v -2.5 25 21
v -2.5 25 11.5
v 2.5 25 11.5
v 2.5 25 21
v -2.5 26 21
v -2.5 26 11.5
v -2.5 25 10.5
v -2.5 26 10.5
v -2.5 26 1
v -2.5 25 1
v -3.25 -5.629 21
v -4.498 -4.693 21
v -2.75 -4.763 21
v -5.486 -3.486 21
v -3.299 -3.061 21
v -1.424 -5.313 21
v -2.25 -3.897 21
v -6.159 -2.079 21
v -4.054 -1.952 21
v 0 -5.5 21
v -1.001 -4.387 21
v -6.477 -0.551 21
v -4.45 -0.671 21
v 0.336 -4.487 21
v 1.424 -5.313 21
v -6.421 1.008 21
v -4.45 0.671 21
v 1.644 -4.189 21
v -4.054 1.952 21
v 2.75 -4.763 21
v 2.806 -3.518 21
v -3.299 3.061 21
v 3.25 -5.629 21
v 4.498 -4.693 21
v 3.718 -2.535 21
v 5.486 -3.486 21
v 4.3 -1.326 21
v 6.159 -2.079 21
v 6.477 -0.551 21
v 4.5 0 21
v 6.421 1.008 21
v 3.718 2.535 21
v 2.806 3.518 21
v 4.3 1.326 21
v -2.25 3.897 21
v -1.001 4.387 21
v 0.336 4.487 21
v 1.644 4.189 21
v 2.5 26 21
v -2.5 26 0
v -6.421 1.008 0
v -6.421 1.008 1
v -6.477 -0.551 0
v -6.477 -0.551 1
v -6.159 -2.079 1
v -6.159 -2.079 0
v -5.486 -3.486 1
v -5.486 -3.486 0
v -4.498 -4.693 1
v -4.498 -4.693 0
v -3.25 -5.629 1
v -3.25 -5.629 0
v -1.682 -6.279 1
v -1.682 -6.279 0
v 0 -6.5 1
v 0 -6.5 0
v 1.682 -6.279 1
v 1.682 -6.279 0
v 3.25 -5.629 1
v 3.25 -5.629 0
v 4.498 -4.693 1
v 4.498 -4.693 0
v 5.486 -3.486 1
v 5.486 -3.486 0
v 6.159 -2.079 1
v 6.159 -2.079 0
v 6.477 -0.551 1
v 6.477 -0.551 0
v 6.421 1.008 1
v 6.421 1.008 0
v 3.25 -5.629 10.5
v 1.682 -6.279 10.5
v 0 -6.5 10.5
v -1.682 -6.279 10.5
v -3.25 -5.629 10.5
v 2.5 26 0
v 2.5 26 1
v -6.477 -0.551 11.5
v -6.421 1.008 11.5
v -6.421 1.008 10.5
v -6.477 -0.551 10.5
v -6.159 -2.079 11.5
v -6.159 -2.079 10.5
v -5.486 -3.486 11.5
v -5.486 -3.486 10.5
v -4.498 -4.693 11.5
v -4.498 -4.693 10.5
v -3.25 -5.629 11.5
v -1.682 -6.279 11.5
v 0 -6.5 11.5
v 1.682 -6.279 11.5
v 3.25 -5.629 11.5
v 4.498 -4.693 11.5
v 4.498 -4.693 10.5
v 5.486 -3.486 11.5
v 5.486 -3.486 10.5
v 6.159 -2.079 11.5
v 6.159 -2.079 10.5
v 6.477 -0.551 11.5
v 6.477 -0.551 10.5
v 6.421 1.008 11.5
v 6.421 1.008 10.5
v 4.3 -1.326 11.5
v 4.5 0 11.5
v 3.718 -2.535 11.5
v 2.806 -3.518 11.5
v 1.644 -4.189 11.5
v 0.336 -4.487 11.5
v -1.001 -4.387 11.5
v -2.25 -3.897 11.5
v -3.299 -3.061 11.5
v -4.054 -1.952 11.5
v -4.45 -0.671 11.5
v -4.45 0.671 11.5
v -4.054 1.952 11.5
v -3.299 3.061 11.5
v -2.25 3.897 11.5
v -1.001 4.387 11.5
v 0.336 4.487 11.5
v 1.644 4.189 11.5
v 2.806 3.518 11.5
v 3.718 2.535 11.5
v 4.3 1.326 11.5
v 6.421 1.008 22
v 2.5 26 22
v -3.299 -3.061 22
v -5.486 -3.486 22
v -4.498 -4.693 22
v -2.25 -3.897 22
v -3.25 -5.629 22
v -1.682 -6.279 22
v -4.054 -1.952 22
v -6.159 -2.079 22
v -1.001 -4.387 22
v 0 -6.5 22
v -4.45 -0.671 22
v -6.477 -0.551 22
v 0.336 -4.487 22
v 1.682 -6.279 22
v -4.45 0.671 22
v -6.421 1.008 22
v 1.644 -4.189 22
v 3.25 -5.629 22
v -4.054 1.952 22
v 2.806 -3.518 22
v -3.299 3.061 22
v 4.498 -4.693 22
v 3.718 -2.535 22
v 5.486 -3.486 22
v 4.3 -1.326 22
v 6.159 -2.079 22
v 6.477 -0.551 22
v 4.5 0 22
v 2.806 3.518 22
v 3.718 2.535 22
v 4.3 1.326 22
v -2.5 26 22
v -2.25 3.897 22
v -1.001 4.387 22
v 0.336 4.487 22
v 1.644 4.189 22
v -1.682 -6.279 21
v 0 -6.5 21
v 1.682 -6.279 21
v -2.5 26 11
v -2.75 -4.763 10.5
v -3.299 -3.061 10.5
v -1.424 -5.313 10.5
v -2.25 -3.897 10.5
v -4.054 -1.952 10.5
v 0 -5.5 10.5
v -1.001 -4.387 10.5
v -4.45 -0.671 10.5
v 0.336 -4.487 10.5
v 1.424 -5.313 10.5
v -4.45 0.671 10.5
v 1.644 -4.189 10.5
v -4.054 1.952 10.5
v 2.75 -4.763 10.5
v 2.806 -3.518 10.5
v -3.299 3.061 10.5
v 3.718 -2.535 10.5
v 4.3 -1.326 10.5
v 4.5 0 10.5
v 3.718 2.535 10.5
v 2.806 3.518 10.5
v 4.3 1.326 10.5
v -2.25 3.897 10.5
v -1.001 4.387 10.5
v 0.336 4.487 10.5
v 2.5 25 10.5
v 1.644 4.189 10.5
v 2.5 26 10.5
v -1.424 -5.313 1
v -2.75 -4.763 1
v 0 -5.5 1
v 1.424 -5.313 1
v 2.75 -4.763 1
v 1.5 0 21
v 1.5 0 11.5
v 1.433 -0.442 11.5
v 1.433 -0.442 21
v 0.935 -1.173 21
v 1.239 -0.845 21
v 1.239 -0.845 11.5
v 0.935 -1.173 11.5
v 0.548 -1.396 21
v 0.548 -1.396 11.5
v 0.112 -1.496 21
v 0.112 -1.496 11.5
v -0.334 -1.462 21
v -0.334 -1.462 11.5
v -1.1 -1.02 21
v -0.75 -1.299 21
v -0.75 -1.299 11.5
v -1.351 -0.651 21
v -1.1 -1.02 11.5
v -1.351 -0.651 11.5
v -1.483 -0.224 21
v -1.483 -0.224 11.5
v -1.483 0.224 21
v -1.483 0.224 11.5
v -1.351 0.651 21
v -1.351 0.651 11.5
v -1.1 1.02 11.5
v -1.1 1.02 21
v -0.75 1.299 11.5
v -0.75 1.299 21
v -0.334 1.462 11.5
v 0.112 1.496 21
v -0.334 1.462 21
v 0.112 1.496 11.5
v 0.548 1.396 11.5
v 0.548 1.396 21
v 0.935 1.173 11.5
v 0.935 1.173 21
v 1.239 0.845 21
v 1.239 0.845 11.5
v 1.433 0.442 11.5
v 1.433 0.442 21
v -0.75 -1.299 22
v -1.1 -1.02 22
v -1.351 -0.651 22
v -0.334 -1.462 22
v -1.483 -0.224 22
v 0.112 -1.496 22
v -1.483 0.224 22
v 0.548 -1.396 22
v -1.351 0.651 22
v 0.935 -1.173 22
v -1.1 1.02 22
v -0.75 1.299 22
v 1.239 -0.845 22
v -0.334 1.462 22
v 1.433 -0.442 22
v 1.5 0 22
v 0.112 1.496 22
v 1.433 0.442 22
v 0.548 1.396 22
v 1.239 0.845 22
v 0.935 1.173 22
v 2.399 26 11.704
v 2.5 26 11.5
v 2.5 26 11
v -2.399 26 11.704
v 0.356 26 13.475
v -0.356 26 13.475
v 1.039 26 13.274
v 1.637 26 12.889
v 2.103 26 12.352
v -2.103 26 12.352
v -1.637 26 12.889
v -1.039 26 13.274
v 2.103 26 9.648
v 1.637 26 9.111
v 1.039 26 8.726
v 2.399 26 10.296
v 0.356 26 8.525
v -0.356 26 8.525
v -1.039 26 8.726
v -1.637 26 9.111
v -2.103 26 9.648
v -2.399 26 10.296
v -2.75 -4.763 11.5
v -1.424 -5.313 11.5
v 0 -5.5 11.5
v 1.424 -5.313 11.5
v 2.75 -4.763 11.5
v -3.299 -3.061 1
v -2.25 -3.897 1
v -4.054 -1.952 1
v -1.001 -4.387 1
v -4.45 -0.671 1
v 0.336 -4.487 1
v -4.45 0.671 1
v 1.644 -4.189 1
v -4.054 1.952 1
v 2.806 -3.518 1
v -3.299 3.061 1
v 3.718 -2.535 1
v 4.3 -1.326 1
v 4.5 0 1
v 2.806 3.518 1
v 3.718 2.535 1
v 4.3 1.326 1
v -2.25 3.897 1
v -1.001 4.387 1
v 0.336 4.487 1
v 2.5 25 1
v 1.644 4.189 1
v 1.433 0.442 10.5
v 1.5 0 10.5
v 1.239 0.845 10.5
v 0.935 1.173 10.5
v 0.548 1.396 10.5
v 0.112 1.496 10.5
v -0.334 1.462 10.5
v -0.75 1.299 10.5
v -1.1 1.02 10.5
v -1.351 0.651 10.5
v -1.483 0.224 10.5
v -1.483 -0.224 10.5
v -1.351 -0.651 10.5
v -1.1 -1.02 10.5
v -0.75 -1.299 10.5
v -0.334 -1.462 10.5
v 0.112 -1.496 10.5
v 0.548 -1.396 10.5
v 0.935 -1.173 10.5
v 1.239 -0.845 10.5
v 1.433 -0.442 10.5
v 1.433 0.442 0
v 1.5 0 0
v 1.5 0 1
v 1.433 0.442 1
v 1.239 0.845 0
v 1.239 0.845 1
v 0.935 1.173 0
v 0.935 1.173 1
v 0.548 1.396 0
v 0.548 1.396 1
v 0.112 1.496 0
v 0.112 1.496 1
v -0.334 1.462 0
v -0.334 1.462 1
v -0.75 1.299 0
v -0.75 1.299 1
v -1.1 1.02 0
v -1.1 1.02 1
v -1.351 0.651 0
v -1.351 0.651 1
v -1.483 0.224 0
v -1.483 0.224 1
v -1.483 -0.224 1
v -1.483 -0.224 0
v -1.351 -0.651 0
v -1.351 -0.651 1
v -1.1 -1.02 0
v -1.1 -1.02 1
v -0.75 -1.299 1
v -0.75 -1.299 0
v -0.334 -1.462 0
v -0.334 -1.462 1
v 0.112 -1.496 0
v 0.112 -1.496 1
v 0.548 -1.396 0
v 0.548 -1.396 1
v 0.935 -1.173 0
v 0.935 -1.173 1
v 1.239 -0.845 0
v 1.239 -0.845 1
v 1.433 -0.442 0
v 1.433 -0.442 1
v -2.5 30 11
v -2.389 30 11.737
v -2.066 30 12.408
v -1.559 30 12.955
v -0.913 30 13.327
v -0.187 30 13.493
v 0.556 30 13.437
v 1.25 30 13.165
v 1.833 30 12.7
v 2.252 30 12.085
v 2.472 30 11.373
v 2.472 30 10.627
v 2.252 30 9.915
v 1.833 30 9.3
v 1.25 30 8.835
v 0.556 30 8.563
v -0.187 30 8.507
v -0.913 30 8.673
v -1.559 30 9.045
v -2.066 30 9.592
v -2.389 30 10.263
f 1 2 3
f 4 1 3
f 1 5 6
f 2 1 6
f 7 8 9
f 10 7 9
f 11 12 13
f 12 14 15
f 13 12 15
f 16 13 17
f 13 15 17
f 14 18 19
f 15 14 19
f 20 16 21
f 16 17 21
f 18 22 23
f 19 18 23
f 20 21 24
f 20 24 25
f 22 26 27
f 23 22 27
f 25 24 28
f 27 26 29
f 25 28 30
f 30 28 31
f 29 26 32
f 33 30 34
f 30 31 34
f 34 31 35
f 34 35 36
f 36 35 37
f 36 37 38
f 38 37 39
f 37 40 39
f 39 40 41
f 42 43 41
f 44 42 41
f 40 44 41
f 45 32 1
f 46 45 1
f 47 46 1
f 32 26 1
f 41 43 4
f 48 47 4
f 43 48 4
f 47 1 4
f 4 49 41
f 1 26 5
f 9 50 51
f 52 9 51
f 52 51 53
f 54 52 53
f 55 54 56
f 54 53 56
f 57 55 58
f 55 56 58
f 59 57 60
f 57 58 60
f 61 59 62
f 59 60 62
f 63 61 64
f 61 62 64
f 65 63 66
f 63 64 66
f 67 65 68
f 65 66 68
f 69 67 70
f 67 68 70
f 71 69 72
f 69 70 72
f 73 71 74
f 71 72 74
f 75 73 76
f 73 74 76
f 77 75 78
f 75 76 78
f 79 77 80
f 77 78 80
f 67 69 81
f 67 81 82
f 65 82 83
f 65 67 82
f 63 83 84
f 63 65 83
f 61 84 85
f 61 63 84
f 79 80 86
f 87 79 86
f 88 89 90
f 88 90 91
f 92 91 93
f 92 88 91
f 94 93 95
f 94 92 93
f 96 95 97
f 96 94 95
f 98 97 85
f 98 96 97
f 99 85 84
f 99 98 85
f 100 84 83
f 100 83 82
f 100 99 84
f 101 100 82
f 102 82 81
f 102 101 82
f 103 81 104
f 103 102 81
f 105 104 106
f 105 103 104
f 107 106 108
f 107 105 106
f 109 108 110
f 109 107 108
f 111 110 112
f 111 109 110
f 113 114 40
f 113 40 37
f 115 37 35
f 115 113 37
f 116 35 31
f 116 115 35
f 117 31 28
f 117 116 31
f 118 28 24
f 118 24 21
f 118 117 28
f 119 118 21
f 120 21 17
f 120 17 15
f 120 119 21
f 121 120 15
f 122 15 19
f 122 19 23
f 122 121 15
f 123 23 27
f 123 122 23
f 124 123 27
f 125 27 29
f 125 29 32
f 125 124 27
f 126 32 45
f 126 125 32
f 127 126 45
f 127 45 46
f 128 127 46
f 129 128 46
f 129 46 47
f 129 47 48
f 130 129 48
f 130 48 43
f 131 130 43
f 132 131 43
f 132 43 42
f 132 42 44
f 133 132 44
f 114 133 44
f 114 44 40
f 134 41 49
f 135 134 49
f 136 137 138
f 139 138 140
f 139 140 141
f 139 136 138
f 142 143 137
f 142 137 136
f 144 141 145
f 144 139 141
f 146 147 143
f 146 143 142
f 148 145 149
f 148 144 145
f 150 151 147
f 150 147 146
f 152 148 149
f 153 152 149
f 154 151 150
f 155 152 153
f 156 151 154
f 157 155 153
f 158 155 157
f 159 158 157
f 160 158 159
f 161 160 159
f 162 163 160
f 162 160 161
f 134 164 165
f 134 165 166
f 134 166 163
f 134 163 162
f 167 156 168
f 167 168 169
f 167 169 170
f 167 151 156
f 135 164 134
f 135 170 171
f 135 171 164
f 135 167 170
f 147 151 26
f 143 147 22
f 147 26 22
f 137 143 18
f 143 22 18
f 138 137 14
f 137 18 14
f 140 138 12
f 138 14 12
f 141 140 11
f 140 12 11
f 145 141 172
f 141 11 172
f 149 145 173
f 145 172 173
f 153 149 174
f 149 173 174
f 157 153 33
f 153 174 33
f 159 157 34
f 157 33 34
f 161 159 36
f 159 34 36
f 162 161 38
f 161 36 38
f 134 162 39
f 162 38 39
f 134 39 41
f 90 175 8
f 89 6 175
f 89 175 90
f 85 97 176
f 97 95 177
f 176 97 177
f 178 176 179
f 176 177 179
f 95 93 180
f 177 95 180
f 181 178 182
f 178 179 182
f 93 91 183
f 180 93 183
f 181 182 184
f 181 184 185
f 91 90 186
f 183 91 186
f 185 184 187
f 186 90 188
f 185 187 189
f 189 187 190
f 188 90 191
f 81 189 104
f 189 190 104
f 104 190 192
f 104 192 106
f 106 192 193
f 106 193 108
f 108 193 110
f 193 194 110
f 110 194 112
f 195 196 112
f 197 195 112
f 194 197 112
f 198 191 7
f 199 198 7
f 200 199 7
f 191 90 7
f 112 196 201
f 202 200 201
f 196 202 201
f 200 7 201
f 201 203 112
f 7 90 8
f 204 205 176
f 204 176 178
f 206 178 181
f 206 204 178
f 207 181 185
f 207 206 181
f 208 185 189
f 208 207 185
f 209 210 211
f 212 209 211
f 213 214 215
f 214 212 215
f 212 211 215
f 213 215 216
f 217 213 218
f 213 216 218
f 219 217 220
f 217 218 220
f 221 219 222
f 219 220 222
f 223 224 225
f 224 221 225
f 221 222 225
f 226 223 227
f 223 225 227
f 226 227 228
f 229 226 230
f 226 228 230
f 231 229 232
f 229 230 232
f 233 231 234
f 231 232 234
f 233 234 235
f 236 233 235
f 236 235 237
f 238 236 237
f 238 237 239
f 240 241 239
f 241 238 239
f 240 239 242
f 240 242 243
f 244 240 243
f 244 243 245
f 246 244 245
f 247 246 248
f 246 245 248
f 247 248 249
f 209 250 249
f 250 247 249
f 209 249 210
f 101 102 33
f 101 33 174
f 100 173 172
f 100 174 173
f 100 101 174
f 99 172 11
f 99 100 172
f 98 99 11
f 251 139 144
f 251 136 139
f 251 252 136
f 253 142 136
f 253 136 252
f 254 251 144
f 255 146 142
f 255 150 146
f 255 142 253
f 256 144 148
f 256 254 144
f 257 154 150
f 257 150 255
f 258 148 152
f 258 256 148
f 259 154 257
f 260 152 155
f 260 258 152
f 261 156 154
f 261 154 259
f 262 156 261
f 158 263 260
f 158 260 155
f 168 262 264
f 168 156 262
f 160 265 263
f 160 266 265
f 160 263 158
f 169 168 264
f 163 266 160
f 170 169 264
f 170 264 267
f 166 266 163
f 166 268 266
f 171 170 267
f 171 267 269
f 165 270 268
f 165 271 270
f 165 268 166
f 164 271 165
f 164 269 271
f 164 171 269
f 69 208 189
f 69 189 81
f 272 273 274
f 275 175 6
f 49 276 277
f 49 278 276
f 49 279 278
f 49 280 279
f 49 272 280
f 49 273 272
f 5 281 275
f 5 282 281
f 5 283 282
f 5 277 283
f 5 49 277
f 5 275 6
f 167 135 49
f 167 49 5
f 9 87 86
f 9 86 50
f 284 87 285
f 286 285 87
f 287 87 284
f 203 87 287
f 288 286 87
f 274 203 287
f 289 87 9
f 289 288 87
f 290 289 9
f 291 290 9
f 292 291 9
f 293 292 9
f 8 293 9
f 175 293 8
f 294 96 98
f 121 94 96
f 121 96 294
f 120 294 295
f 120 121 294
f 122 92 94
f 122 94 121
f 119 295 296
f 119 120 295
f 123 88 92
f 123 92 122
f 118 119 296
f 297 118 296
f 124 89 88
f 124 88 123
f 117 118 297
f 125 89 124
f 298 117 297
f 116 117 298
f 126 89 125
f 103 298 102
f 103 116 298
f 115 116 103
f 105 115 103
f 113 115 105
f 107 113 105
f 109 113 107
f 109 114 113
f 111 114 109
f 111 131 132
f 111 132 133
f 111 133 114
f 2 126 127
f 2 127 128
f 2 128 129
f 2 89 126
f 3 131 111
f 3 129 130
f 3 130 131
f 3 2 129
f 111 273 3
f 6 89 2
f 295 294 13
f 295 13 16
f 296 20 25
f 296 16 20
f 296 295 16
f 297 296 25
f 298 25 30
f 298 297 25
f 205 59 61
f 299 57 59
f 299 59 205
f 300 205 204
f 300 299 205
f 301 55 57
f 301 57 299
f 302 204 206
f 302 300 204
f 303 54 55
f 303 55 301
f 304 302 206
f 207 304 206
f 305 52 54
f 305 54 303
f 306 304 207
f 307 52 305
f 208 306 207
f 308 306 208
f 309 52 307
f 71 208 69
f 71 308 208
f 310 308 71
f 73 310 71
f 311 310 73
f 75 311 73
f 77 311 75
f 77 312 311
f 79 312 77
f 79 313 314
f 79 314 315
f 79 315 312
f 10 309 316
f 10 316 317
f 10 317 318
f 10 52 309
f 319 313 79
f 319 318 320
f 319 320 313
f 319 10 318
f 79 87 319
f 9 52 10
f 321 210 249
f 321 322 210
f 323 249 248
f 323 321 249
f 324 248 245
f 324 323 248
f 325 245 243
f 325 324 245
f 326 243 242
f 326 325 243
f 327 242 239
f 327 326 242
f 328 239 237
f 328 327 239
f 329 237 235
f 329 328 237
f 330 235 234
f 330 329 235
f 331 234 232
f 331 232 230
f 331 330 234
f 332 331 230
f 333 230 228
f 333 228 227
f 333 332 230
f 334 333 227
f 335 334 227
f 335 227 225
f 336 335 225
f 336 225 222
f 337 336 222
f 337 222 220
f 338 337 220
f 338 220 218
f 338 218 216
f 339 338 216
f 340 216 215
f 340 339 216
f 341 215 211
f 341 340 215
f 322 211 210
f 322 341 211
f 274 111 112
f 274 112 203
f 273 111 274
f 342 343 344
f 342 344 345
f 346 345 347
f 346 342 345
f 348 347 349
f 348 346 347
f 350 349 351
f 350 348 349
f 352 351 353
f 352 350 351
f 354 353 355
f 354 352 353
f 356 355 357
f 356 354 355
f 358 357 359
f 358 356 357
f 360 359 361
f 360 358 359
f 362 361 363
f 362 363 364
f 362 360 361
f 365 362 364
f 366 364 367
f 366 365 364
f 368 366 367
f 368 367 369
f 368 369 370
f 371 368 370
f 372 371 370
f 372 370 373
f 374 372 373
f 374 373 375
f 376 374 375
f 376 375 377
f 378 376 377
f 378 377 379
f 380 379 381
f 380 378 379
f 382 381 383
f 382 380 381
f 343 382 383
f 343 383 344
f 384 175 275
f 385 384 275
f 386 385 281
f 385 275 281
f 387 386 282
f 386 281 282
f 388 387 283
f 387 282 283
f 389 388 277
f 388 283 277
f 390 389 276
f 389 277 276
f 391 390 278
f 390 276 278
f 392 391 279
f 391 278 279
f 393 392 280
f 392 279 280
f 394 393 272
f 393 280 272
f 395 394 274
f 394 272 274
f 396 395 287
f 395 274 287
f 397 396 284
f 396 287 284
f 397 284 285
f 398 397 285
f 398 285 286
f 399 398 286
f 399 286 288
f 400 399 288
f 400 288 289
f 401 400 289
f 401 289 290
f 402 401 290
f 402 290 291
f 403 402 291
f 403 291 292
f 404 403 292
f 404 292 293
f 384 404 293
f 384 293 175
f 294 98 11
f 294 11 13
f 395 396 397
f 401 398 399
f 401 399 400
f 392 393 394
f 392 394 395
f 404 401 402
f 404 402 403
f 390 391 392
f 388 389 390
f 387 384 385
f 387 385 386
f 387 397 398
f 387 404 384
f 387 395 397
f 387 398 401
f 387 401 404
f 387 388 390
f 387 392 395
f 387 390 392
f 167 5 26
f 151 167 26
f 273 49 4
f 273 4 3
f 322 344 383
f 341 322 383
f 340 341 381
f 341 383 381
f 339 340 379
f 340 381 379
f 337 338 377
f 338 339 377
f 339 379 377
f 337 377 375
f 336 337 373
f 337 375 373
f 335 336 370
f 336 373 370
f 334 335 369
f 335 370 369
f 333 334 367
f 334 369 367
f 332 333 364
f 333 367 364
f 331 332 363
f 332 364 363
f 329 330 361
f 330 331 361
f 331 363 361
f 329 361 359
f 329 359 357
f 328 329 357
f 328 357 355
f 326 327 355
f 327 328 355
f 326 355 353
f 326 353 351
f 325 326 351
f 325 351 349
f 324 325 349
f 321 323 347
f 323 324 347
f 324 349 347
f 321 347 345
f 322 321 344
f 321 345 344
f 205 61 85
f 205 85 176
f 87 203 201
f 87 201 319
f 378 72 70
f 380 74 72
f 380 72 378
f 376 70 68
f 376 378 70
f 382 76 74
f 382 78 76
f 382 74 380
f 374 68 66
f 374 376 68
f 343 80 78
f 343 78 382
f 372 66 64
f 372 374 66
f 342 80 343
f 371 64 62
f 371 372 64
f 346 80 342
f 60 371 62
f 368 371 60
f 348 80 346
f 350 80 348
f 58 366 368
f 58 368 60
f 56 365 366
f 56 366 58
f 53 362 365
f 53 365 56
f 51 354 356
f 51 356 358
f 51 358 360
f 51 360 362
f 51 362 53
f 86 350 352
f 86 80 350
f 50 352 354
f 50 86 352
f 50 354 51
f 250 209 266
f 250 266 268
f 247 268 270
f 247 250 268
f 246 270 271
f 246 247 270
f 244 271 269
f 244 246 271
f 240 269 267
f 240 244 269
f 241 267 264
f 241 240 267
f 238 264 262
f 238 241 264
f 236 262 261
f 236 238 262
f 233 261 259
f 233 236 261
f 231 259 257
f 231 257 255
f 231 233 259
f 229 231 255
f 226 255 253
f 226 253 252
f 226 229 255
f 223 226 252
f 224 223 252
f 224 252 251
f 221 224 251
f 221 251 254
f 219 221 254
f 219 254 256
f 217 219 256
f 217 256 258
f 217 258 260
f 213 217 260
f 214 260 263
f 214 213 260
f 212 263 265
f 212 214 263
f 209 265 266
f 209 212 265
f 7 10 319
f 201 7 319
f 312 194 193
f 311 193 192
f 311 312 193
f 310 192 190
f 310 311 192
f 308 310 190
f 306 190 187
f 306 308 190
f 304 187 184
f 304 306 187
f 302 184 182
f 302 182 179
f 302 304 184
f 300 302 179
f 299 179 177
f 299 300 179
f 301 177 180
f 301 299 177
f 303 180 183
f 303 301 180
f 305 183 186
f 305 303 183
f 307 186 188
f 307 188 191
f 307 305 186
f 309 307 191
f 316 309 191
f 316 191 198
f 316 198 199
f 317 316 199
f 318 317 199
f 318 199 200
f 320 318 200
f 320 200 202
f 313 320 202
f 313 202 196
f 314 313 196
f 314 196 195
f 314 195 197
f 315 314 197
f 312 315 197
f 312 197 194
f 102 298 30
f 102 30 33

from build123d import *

# Parameters (mm, degrees)
SKETCH_1_R      = 1.5
EXTRUDE_1_DEPTH = 1
SKETCH_2_W      = 5
SKETCH_2_H      = 22
EXTRUDE_2_DEPTH = 1
EXTRUDE_START   = 21
SKETCH_1_2_R    = 1.5
EXTRUDE_3_DEPTH = 1
EXTRUDE_START_2 = 11
SKETCH_1_3_R    = 1.5
EXTRUDE_4_DEPTH = 0.5
SKETCH_3_R      = 2.5
EXTRUDE_5_DEPTH = 4
EXTRUDE_6_REACH = 39.766
EXTRUDE_7_REACH = 39.766
SKETCH_5_R      = 4.5
SKETCH_5_R_2    = 1.5


with BuildPart() as part:
    # 草图1 → 凸台-拉伸1 (new body)
    with BuildSketch(Plane.XY):
        with BuildLine():
            Line((-2.5, 26), (-6.421436, 1.007554))
            ThreePointArc((-6.421436, 1.007554), (0, -6.5), (6.421436, 1.007554))
            Line((6.421436, 1.007554), (2.5, 26))
            Line((2.5, 26), (-2.5, 26))
        make_face()
        Circle(SKETCH_1_R, mode=Mode.SUBTRACT)
    extrude(amount=EXTRUDE_1_DEPTH)

    # 草图2 → 凸台-拉伸2 (add)
    with BuildSketch(Plane(origin=(0, 26, 0), x_dir=(1, 0, 0), z_dir=(0, 1, 0))):
        with Locations((0, -11)):
            Rectangle(SKETCH_2_W, SKETCH_2_H)
    extrude(amount=-EXTRUDE_2_DEPTH)

    # 草图1<2> → 凸台-拉伸3 (add)
    with BuildSketch(Plane.XY.offset(EXTRUDE_START)):
        with BuildLine():
            Line((-2.5, 26), (-6.421436, 1.007554))
            ThreePointArc((-6.421436, 1.007554), (0, -6.5), (6.421436, 1.007554))
            Line((6.421436, 1.007554), (2.5, 26))
            Line((2.5, 26), (-2.5, 26))
        make_face()
        Circle(SKETCH_1_2_R, mode=Mode.SUBTRACT)
    extrude(amount=EXTRUDE_3_DEPTH)

    # 草图1<3> → 凸台-拉伸4 (add, symmetric)
    with BuildSketch(Plane.XY.offset(EXTRUDE_START_2)):
        with BuildLine():
            Line((-2.5, 26), (-6.421436, 1.007554))
            ThreePointArc((-6.421436, 1.007554), (0, -6.5), (6.421436, 1.007554))
            Line((6.421436, 1.007554), (2.5, 26))
            Line((2.5, 26), (-2.5, 26))
        make_face()
        Circle(SKETCH_1_3_R, mode=Mode.SUBTRACT)
    extrude(amount=EXTRUDE_4_DEPTH, both=True)

    # 草图3 → 凸台-拉伸5 (add)
    with BuildSketch(Plane(origin=(0, 26, 0), x_dir=(1, 0, 0), z_dir=(0, 1, 0))):
        with Locations(Location((0, -11, 0), (0, 0, 180))):
            Circle(SKETCH_3_R)
    extrude(amount=EXTRUDE_5_DEPTH)

    # 凸台-拉伸6: up to this face of the body (flat: up to its plane)
    extrude_6_end = Plane(part.part.faces().sort_by_distance((0, 8.21558, 22))[0])
    # 草图4 → 凸台-拉伸6 (add, up to the picked face)
    with BuildSketch(Plane(origin=(0, 0, 0), x_dir=(-1, 0, 0), z_dir=(0, 0, -1)), mode=Mode.PRIVATE) as extrude_6_sk1:
        with BuildLine():
            Line((-2.75, -4.76314), (-3.25, -5.629165))
            ThreePointArc((-3.25, -5.629165), (0, -6.5), (3.25, -5.629165))
            Line((3.25, -5.629165), (2.75, -4.76314))
            ThreePointArc((2.75, -4.76314), (0, -5.5), (-2.75, -4.76314))
        make_face()
    extrude_6_tool1 = split(extrude(extrude_6_sk1.sketch, amount=-EXTRUDE_6_REACH, mode=Mode.PRIVATE), bisect_by=extrude_6_end, keep=Keep.BOTH, mode=Mode.PRIVATE)
    add(extrude_6_tool1.solids().sort_by(Axis((0, -5.742841, 0), (0, 0, 1)))[0])

    # 凸台-拉伸7: up to this face of the body (flat: up to its plane)
    extrude_7_end = Plane(part.part.faces().sort_by_distance((0, 8.21558, 22))[0])
    # 草图5 → 凸台-拉伸7 (add, up to the picked face)
    with BuildSketch(Plane(origin=(0, 0, 0), x_dir=(-1, 0, 0), z_dir=(0, 0, -1)), mode=Mode.PRIVATE) as extrude_7_sk1:
        with Locations(Location((0, 0, 0), (0, 0, 180))):
            Circle(SKETCH_5_R)
        with Locations(Location((0, 0, 0), (0, 0, 180))):
            Circle(SKETCH_5_R_2, mode=Mode.SUBTRACT)
    extrude_7_tool1 = split(extrude(extrude_7_sk1.sketch, amount=-EXTRUDE_7_REACH, mode=Mode.PRIVATE), bisect_by=extrude_7_end, keep=Keep.BOTH, mode=Mode.PRIVATE)
    add(extrude_7_tool1.solids().sort_by(Axis((-4.372721, 0, 0), (0, 0, 1)))[0])


solid = part.part
